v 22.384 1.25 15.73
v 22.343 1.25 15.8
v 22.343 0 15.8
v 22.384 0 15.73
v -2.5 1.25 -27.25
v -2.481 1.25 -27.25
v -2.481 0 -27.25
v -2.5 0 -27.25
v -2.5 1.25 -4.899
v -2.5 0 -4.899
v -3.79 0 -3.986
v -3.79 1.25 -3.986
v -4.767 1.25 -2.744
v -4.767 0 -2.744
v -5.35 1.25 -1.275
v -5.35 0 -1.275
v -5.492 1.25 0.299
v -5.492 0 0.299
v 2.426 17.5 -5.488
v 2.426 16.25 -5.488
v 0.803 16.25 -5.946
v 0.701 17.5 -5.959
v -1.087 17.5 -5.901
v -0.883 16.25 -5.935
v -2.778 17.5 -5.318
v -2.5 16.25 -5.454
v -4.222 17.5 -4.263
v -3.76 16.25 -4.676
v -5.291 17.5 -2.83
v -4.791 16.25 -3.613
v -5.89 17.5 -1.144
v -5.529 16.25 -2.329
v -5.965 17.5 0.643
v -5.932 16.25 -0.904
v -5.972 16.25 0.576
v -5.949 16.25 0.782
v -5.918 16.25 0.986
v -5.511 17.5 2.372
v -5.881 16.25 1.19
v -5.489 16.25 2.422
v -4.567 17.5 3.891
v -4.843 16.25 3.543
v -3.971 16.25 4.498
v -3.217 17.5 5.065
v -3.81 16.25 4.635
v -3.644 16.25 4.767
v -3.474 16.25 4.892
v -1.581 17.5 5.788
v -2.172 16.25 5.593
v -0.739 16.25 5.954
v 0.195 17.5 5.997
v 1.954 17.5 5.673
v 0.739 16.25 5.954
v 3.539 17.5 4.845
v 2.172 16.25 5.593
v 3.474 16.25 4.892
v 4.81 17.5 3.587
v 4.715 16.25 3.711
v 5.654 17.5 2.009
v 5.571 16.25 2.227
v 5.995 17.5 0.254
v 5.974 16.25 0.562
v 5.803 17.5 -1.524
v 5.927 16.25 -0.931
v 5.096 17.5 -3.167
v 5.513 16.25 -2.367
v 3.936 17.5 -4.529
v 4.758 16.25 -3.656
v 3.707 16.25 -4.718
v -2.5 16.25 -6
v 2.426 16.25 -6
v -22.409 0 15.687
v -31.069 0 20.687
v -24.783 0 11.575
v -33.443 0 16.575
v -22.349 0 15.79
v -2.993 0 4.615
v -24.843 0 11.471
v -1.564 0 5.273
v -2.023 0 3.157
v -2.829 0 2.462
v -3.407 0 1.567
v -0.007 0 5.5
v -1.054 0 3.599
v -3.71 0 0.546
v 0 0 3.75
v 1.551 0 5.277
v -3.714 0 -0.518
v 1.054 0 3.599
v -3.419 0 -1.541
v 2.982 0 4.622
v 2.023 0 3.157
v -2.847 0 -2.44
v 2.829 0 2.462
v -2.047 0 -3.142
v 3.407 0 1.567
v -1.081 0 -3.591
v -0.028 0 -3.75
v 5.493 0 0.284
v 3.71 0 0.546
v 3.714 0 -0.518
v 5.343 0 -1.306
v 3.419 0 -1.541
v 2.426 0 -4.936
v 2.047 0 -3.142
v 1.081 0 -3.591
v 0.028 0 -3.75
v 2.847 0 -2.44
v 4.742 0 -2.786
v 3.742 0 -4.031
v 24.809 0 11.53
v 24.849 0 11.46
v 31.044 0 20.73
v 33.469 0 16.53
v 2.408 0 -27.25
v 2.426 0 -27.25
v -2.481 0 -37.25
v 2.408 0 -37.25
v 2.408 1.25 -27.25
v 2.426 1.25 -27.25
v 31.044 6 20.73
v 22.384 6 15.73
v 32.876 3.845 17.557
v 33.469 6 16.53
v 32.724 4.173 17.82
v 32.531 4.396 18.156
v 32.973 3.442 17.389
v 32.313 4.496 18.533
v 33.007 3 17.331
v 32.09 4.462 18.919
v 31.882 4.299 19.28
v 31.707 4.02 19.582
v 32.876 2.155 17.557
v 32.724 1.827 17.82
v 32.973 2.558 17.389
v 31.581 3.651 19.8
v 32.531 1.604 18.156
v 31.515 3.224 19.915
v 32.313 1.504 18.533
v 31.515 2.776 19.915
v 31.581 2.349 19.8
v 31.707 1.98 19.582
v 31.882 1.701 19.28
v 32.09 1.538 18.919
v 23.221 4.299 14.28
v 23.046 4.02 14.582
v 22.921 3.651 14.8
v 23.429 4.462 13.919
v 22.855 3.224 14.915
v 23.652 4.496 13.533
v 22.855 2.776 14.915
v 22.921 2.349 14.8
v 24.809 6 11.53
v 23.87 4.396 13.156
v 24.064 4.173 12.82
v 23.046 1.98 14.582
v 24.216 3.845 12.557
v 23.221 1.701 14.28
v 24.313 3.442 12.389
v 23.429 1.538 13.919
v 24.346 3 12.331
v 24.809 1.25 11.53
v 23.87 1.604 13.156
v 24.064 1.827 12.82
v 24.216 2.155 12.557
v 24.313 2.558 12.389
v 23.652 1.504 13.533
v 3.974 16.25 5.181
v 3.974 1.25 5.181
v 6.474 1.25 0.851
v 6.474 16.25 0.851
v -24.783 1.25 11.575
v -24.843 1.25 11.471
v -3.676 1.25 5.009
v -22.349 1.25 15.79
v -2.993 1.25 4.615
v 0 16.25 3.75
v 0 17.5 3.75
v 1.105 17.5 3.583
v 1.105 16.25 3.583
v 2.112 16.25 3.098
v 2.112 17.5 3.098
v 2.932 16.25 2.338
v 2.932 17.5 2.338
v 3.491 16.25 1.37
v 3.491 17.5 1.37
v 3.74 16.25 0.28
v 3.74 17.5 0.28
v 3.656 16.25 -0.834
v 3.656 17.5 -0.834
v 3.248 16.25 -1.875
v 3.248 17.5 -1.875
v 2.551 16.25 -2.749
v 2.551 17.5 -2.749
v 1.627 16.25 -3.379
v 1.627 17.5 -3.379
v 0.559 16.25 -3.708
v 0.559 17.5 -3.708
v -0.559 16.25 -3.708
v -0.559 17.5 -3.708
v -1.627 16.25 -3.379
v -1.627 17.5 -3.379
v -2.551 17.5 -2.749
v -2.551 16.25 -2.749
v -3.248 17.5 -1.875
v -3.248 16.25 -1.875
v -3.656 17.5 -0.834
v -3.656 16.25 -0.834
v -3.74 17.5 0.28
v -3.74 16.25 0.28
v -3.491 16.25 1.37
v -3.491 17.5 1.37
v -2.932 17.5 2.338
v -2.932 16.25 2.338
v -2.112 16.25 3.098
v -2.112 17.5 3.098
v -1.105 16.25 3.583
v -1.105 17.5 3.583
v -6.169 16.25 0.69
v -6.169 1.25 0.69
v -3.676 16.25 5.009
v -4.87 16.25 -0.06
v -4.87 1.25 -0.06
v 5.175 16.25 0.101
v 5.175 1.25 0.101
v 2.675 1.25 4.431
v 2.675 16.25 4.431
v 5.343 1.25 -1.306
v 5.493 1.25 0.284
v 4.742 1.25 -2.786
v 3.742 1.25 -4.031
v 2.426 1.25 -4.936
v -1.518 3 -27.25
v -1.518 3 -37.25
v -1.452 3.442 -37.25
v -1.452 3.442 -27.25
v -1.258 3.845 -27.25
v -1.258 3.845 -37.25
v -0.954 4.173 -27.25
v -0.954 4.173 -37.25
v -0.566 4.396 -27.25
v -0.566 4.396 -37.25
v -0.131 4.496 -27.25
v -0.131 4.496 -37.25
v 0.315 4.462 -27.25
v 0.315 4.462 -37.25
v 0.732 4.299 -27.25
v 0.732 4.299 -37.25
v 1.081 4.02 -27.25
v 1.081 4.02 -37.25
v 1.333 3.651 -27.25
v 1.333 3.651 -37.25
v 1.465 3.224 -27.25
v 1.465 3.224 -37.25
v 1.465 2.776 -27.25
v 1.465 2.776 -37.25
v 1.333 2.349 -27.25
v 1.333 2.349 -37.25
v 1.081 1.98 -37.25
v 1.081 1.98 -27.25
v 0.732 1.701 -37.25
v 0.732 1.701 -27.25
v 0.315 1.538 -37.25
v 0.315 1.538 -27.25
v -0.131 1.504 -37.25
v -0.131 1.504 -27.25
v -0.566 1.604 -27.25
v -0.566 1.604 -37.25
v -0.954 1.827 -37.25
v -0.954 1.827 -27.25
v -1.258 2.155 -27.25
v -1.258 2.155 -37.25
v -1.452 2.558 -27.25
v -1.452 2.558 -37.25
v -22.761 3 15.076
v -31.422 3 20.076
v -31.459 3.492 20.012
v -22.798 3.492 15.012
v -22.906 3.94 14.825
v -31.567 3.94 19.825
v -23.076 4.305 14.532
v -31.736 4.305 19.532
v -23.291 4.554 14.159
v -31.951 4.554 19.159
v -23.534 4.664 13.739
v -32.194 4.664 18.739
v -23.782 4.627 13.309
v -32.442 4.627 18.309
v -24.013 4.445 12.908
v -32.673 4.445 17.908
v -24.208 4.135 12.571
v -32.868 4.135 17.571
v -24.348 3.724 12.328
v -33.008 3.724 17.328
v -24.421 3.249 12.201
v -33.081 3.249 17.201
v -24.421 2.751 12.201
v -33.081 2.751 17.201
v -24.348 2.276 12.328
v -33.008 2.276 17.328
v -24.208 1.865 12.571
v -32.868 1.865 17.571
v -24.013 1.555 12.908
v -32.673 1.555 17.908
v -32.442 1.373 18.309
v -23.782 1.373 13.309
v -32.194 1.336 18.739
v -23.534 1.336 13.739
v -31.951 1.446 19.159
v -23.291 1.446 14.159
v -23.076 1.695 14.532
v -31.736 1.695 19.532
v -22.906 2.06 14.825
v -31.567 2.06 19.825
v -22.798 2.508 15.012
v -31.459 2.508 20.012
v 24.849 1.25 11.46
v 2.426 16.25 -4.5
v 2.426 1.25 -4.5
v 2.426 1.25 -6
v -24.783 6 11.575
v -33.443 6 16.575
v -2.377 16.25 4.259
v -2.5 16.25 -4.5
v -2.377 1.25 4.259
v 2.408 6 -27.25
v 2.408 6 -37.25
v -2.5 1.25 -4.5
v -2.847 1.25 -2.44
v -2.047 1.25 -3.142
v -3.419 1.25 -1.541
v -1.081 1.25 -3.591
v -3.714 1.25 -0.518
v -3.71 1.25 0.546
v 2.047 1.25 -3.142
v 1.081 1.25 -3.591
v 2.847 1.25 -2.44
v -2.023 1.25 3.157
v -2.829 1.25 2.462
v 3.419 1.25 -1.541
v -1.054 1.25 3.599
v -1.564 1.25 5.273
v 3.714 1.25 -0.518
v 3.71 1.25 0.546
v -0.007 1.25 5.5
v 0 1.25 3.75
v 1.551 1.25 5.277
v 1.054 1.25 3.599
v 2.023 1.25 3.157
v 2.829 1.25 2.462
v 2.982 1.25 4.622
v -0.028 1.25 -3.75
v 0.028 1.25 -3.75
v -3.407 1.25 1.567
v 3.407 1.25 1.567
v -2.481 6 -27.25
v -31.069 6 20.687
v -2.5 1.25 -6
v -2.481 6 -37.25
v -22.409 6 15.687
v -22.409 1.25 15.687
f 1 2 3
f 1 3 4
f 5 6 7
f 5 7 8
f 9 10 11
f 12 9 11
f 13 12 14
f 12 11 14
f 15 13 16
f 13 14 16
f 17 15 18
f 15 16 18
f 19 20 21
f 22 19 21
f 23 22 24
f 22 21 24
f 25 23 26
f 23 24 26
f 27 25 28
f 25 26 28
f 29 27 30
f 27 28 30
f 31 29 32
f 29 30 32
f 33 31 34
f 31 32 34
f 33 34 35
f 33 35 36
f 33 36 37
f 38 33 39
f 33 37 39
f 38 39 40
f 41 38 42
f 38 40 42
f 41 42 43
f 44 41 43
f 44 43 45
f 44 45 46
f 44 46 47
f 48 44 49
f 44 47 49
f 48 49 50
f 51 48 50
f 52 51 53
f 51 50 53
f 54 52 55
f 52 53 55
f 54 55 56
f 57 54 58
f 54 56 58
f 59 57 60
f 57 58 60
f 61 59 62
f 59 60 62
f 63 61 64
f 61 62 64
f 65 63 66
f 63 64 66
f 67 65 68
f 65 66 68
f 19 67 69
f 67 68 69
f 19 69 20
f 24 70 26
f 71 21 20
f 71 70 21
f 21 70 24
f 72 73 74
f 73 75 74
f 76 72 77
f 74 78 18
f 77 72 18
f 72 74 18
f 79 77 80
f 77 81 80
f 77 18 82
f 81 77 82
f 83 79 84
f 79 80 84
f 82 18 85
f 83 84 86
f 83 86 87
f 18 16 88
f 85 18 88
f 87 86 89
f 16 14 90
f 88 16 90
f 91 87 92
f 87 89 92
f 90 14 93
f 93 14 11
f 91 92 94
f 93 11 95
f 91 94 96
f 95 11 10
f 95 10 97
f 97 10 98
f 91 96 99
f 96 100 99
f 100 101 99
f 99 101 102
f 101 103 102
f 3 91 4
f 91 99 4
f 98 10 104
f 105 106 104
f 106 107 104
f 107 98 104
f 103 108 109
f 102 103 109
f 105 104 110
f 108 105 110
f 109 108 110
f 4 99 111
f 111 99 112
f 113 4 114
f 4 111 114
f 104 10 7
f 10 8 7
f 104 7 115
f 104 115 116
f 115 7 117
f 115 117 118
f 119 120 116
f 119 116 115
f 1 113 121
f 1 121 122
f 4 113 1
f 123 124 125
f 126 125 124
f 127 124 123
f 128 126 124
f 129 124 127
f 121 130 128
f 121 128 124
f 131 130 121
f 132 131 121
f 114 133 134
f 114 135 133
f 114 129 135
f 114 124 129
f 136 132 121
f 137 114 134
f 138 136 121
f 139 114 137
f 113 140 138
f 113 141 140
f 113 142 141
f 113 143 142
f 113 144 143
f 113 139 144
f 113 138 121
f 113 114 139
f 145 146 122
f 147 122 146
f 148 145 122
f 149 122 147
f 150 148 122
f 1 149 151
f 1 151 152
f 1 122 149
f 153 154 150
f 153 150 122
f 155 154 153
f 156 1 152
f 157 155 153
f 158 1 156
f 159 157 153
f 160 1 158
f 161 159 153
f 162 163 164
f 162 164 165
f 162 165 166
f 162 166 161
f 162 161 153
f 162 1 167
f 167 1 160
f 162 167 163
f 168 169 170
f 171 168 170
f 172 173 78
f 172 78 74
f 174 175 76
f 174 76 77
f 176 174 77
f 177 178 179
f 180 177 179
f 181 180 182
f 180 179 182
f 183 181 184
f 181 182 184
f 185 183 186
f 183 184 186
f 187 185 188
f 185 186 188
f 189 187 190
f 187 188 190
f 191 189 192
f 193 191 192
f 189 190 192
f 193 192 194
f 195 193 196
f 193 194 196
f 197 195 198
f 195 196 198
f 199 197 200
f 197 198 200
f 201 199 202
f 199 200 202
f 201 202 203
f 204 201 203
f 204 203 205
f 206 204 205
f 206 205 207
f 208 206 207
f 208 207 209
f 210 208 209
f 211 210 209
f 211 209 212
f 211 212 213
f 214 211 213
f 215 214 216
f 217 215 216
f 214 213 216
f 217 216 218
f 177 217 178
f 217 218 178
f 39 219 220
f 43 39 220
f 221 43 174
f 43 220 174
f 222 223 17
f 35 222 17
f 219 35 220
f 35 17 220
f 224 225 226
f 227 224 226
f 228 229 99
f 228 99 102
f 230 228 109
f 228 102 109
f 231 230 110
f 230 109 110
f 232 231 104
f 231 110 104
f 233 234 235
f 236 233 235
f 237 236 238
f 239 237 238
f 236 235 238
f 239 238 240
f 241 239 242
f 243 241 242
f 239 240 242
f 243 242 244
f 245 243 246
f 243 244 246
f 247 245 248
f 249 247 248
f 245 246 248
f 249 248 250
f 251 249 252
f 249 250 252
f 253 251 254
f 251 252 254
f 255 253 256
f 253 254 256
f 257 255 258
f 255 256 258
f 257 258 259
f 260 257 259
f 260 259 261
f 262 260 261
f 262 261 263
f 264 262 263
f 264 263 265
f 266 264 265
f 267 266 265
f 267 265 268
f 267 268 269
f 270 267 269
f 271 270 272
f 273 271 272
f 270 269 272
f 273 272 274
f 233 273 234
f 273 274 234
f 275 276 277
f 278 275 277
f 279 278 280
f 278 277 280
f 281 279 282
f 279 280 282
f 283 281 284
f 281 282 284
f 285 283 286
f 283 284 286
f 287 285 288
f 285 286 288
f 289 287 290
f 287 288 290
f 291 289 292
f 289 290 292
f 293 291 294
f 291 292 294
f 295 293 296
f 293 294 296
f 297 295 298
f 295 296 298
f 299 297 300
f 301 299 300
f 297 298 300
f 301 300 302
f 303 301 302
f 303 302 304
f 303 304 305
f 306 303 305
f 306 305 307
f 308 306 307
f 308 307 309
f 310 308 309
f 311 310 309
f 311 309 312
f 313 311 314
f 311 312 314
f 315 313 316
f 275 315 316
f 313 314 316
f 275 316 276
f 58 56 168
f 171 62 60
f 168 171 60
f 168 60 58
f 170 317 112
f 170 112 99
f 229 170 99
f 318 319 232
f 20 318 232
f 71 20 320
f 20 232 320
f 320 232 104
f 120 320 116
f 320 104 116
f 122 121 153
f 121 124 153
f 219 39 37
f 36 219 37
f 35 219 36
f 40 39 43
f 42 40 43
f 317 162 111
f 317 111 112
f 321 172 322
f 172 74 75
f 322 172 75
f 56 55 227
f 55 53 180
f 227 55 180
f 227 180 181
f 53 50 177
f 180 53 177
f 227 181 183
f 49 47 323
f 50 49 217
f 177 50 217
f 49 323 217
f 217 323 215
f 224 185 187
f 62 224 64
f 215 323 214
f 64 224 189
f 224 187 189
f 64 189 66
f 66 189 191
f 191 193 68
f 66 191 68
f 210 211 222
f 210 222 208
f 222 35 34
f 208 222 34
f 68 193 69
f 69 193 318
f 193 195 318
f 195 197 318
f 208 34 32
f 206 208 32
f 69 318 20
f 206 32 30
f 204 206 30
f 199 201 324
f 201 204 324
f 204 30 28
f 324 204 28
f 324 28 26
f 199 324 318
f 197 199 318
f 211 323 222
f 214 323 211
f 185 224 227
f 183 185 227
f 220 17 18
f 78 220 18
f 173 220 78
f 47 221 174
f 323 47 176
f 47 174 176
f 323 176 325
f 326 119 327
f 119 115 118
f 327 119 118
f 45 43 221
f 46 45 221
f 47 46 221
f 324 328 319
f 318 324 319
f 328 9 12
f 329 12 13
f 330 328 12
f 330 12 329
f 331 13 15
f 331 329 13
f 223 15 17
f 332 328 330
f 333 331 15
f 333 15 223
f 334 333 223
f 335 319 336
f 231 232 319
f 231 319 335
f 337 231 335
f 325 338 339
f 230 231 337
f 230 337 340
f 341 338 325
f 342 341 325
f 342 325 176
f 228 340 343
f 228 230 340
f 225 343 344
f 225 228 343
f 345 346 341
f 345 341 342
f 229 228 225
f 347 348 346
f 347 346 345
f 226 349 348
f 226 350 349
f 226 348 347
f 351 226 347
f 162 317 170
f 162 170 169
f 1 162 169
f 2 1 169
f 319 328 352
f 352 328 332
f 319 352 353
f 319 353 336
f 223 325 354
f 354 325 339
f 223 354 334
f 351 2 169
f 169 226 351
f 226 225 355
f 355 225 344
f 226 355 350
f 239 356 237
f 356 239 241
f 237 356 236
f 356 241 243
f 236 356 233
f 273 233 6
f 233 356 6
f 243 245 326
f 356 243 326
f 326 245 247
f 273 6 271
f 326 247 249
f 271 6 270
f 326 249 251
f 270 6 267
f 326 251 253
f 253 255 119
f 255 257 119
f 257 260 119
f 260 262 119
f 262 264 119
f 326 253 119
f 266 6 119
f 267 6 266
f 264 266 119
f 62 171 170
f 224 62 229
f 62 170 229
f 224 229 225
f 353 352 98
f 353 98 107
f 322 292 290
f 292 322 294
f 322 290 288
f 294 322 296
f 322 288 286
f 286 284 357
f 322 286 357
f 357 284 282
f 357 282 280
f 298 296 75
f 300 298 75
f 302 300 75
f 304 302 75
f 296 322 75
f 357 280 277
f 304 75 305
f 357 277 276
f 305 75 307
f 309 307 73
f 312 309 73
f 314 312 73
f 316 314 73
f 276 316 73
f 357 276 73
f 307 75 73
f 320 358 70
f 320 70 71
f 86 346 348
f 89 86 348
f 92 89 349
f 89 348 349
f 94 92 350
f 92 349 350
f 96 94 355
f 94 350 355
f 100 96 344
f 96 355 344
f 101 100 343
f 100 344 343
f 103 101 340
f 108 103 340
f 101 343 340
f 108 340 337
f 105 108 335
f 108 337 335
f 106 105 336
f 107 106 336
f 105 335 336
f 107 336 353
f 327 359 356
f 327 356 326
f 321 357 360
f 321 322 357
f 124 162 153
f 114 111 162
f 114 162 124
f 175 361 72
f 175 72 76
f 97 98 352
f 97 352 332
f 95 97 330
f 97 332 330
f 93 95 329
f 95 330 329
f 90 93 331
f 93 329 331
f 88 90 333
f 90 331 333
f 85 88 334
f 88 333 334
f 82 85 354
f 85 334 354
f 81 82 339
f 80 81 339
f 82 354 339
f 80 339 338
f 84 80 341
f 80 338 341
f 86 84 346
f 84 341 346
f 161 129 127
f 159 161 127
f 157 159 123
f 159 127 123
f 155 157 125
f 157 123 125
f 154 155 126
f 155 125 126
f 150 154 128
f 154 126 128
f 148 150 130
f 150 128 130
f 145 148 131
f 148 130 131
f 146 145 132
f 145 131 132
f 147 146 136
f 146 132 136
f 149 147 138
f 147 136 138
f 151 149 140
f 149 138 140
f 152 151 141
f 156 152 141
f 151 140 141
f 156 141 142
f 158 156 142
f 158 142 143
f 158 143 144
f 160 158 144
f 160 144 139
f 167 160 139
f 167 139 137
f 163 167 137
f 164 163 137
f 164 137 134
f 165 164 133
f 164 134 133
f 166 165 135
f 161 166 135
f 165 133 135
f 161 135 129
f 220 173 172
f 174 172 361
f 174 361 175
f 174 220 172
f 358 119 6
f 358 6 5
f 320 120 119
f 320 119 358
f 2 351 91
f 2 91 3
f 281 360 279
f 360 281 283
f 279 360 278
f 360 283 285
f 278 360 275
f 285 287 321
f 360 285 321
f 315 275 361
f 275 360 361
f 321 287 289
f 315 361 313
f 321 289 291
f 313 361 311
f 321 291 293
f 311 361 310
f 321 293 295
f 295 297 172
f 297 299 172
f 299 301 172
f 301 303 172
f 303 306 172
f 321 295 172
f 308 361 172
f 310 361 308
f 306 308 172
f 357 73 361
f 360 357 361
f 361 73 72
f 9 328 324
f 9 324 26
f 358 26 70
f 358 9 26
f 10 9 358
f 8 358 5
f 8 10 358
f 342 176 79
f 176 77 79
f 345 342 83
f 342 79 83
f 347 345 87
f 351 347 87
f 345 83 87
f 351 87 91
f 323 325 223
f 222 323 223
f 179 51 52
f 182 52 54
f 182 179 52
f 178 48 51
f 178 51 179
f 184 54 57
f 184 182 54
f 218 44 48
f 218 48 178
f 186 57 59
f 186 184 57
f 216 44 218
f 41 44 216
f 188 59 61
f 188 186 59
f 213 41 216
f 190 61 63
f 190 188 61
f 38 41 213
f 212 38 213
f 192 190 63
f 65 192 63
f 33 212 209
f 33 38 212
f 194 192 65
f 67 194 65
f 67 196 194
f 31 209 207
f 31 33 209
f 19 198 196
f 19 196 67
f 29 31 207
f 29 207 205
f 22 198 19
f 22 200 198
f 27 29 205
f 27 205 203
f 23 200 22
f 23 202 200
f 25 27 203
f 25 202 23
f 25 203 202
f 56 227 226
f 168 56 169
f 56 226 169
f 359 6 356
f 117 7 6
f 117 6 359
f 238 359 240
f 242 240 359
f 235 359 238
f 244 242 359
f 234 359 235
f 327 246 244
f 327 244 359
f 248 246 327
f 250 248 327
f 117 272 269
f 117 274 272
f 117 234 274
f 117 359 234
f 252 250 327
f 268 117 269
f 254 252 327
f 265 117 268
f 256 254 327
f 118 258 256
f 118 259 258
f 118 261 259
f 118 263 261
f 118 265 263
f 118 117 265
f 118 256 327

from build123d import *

# Parameters (mm, degrees)
SKETCH1_R                = 5.5
BOSS_EXTRUDE1_DEPTH      = 1.25
SKETCH2_R                = 3.75
CUT_EXTRUDE1_DEPTH       = 1.25
BOSS_EXTRUDE6_DEPTH      = 1.25
SKETCH6_W                = 4.926299948
SKETCH6_H                = 1.5
BOSS_EXTRUDE7_DEPTH      = 15
SKETCH8_R                = 6
BOSS_EXTRUDE8_DEPTH      = 1.25
SKETCH9_R                = 3.75
CUT_EXTRUDE3_DEPTH       = 1.25
BOSS_EXTRUDE9_DEPTH      = 4.75
BOSS_EXTRUDE9_DEPTH_BACK = 1.25
SKETCH10_W               = 4.888756282
SKETCH10_H               = 10
SKETCH11_R               = 1.669068308
CUT_EXTRUDE4_DEPTH       = 10
SKETCH12_R               = 1.5
CUT_EXTRUDE5_DEPTH       = 10
SKETCH13_R               = 1.5
CUT_EXTRUDE6_DEPTH       = 10


with BuildPart() as part:
    # Sketch1 → Boss-Extrude1 (new body)
    with BuildSketch(Plane(origin=(0, 0, 0), x_dir=(1, 0, 0), z_dir=(0, 1, 0))):
        with Locations(Location((0, 0, 0), (0, 0, 270))):
            Circle(SKETCH1_R)
    extrude(amount=BOSS_EXTRUDE1_DEPTH)

    # Sketch2 → Cut-Extrude1 (cut)
    with BuildSketch(Plane(origin=(0, 1.25, 0), x_dir=(1, 0, 0), z_dir=(0, 1, 0))):
        with Locations(Location((0, 0, 0), (0, 0, 270))):
            Circle(SKETCH2_R)
    extrude(amount=-CUT_EXTRUDE1_DEPTH, mode=Mode.SUBTRACT)

    # Sketch3 → Boss-Extrude6 (add)
    with BuildSketch(Plane(origin=(0, 1.25, 0), x_dir=(1, 0, 0), z_dir=(0, 1, 0))):
        Polygon((-2.5, 3.749893265), (0, 3.749893265), (2.426299948, 3.749893265), (2.426299948, 27.250106735), (-2.5, 27.250106735), align=None)
        Polygon((-1.997595264, -4.040063509), (-3.247595264, -1.875), (-4.49106014, 0.278744342), (-24.842657128, -11.471255658), (-22.349192253, -15.790063509), align=None)
        Polygon((4.497595264, 0.290063509), (3.247595264, -1.875), (1.99170365, -4.050268084), (22.343300639, -15.800268084), (24.849192253, -11.459936491), align=None)
    extrude(amount=-BOSS_EXTRUDE6_DEPTH)

    # Sketch6 → Boss-Extrude7 (add)
    with BuildSketch(Plane(origin=(0, 1.25, 0), x_dir=(1, 0, 0), z_dir=(0, 1, 0))):
        with Locations((-0.036850026, 5.250106735)):
            Rectangle(SKETCH6_W, SKETCH6_H)
        Polygon((-6.169311431, -0.690194493), (-3.675846556, -5.009002344), (-2.37680845, -4.259002344), (-4.870273325, 0.059805507), align=None)
        Polygon((3.974013034, -5.181148841), (6.474013034, -0.851021822), (5.174974928, -0.101021822), (2.674974928, -4.431148841), align=None)
    extrude(amount=BOSS_EXTRUDE7_DEPTH)

    # Sketch8 → Boss-Extrude8 (add)
    with BuildSketch(Plane(origin=(0, 16.25, 0), x_dir=(1, 0, 0), z_dir=(0, 1, 0))):
        with Locations(Location((0, 0, 0), (0, 0, 66.147511133))):
            Circle(SKETCH8_R)
    extrude(amount=BOSS_EXTRUDE8_DEPTH)

    # Sketch9 → Cut-Extrude3 (cut)
    with BuildSketch(Plane(origin=(0, 17.5, 0), x_dir=(1, 0, 0), z_dir=(0, 1, 0))):
        with Locations(Location((0, 0, 0), (0, 0, 270))):
            Circle(SKETCH9_R)
    extrude(amount=-CUT_EXTRUDE3_DEPTH, mode=Mode.SUBTRACT)

    # Sketch10 → Boss-Extrude9 (add, two sides: drawn at the far end of the back side and taken through both)
    with BuildSketch(Plane(origin=(0, 1.25, 0), x_dir=(1, 0, 0), z_dir=(0, 1, 0)).offset(-BOSS_EXTRUDE9_DEPTH_BACK)):
        Polygon((-31.069234844, -20.686506698), (-22.408980806, -15.686506698), (-24.782868576, -11.57481247), (-33.443122613, -16.57481247), align=None)
        with Locations((-0.036850026, 32.250106735)):
            Rectangle(SKETCH10_W, SKETCH10_H)
        Polygon((31.044029351, -20.730163892), (22.383775314, -15.730163892), (24.808717579, -11.530040683), (33.468971617, -16.530040683), align=None)
    extrude(amount=BOSS_EXTRUDE9_DEPTH + BOSS_EXTRUDE9_DEPTH_BACK)

    # Sketch11 → Cut-Extrude4 (cut)
    with BuildSketch(Plane(origin=(-32.259446291, 0, 18.625), x_dir=(0.5000000000000004, 0, 0.8660254037844385), z_dir=(-0.8660254037844384, 0, 0.5000000000000003))):
        with Locations((0.006535125, 3)):
            Circle(SKETCH11_R)
    extrude(amount=-CUT_EXTRUDE4_DEPTH, mode=Mode.SUBTRACT)

    # Sketch12 → Cut-Extrude5 (cut)
    with BuildSketch(Plane(origin=(0, 0, -37.250106735), x_dir=(-1, 0, 0), z_dir=(0, 0, -1))):
        with Locations((0.018425013, 3)):
            Circle(SKETCH12_R)
    extrude(amount=-CUT_EXTRUDE5_DEPTH, mode=Mode.SUBTRACT)

    # Sketch13 → Cut-Extrude6 (cut)
    with BuildSketch(Plane(origin=(32.259446291, 0, 18.625), x_dir=(0.4999999999999998, 0, -0.8660254037844388), z_dir=(0.8660254037844388, 0, 0.4999999999999998))):
        with Locations((-0.005891614, 3)):
            Circle(SKETCH13_R)
    extrude(amount=-CUT_EXTRUDE6_DEPTH, mode=Mode.SUBTRACT)


solid = part.part
